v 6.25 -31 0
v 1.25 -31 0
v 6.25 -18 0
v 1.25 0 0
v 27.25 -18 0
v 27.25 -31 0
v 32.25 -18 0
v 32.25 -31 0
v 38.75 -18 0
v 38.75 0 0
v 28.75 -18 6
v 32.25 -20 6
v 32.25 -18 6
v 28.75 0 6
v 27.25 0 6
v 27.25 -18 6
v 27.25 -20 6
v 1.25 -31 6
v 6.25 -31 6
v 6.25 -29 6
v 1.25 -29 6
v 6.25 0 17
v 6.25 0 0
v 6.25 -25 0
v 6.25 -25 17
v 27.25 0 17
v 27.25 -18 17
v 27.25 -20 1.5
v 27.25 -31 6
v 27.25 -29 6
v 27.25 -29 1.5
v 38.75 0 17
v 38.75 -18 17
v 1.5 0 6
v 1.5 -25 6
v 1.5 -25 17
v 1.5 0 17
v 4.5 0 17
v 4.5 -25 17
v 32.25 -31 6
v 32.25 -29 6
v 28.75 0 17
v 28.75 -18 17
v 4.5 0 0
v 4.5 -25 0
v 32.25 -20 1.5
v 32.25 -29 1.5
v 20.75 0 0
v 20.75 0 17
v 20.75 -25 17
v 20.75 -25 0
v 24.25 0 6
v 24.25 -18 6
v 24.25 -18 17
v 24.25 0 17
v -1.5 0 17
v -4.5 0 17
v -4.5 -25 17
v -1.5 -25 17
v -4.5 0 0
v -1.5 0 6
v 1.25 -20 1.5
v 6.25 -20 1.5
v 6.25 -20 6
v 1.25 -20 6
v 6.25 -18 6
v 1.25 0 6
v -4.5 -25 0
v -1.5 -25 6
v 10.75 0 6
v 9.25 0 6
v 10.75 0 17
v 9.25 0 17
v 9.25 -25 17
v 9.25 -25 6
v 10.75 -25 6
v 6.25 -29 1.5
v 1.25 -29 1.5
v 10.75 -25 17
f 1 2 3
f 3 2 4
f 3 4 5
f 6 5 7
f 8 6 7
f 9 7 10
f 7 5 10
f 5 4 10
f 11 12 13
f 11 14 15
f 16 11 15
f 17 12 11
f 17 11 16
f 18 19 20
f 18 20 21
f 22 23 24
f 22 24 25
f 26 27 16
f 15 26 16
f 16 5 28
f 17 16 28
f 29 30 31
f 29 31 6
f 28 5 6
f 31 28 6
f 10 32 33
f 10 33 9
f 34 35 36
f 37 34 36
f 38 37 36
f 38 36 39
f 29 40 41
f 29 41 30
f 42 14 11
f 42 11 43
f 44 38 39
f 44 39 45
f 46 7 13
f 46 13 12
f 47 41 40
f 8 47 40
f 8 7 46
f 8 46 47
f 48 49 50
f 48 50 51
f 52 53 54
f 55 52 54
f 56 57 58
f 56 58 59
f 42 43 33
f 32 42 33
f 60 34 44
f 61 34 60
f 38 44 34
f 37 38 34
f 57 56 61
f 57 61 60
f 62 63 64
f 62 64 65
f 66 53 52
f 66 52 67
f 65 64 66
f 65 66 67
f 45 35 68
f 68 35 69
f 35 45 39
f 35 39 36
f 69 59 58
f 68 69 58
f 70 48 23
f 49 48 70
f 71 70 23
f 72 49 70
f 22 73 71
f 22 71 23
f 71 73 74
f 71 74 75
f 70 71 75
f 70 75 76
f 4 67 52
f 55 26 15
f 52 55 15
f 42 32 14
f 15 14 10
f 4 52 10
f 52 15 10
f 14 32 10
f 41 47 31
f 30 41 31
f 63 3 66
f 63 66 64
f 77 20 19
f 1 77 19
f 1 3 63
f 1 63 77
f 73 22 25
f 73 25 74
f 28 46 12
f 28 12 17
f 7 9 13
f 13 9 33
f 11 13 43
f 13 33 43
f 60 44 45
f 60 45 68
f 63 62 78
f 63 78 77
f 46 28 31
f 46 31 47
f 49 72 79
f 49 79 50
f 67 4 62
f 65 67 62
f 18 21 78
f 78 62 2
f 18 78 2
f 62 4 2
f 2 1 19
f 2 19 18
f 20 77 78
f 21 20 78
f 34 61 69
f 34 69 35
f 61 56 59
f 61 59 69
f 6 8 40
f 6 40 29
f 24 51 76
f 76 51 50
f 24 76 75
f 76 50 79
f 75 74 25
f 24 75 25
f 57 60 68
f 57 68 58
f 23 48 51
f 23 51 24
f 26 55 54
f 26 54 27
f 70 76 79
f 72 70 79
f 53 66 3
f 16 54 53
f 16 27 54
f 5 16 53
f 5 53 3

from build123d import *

# Parameters (mm, degrees)
PAD_DEPTH    = 25
PAD001_DEPTH = 25
PAD002_DEPTH = 18
SKETCH_W     = 5
SKETCH_H     = 1.5
PAD003_DEPTH = 13
SKETCH004_W  = 5
SKETCH004_H  = 2
PAD004_DEPTH = 4.5
SKETCH005_W  = 6
SKETCH005_H  = 18
PAD005_DEPTH = 23
SKETCH006_W  = 5
SKETCH006_H  = 1.5
PAD006_DEPTH = 13
SKETCH007_W  = 5
SKETCH007_H  = 2
PAD007_DEPTH = 4.5


with BuildPart() as zwykly:
    # Sketch001 → Pad (new body)
    with BuildSketch(Plane.XZ):
        Polygon((-4.5, 17), (-1.5, 17), (-1.5, 6), (1.5, 6), (1.5, 17), (4.5, 17), (4.5, 0), (-4.5, 0), align=None)
    extrude(amount=PAD_DEPTH)


with BuildPart() as krancowy:
    # Sketch002 → Pad001 (new body)
    with BuildSketch(Plane(origin=(10, 0, 0), x_dir=(1, 0, 0), z_dir=(0, -1, 0))):
        Polygon((-3.75, 17), (-0.75, 17), (-0.75, 6), (0.75, 6), (0.75, 17), (10.75, 17), (10.75, 0), (-3.75, 0), align=None)
    extrude(amount=PAD001_DEPTH)


with BuildPart() as antenowy_gotowy:
    # Sketch003 → Pad002 (new body)
    with BuildSketch(Plane(origin=(28, 0, 0), x_dir=(1, 0, 0), z_dir=(0, -1, 0))):
        Polygon((-3.75, 17), (-0.75, 17), (-0.75, 6), (0.75, 6), (0.75, 17), (10.75, 17), (10.75, 0), (-3.75, 0), align=None)
    extrude(amount=PAD002_DEPTH)

    # Sketch → Pad003 (new body)
    with BuildSketch(Plane(origin=(28, -18, 0), x_dir=(1, 0, 0), z_dir=(0, -1, 0))):
        with Locations((1.75, 0.75)):
            Rectangle(SKETCH_W, SKETCH_H)
    extrude(amount=PAD003_DEPTH)

    # Sketch004 → Pad004 (new body)
    with BuildSketch(Plane(origin=(28, 0, 1.5), x_dir=(-1, 0, 0), z_dir=(0, 0, 1))):
        with Locations((-1.75, 30)):
            Rectangle(SKETCH004_W, SKETCH004_H)
        with Locations((-1.75, 19)):
            Rectangle(SKETCH004_W, SKETCH004_H)
    extrude(amount=PAD004_DEPTH)

    # Sketch005 → Pad005 (new body)
    with BuildSketch(Plane(origin=(24.25, 0, 0), x_dir=(0, 0, -1), z_dir=(-1, 0, 0))):
        with Locations((-3, 9)):
            Rectangle(SKETCH005_W, SKETCH005_H)
    extrude(amount=PAD005_DEPTH)

    # Sketch006 → Pad006 (new body)
    with BuildSketch(Plane(origin=(28, -18, 0), x_dir=(1, 0, 0), z_dir=(0, -1, 0))):
        with Locations((-24.25, 0.75)):
            Rectangle(SKETCH006_W, SKETCH006_H)
    extrude(amount=PAD006_DEPTH)

    # Sketch007 → Pad007 (new body)
    with BuildSketch(Plane(origin=(28, 0, 1.5), x_dir=(-1, 0, 0), z_dir=(0, 0, 1))):
        with Locations((24.25, 30)):
            Rectangle(SKETCH007_W, SKETCH007_H)
        with Locations((24.25, 19)):
            Rectangle(SKETCH007_W, SKETCH007_H)
    extrude(amount=PAD007_DEPTH)


solid = Compound([zwykly.part, krancowy.part, antenowy_gotowy.part])
